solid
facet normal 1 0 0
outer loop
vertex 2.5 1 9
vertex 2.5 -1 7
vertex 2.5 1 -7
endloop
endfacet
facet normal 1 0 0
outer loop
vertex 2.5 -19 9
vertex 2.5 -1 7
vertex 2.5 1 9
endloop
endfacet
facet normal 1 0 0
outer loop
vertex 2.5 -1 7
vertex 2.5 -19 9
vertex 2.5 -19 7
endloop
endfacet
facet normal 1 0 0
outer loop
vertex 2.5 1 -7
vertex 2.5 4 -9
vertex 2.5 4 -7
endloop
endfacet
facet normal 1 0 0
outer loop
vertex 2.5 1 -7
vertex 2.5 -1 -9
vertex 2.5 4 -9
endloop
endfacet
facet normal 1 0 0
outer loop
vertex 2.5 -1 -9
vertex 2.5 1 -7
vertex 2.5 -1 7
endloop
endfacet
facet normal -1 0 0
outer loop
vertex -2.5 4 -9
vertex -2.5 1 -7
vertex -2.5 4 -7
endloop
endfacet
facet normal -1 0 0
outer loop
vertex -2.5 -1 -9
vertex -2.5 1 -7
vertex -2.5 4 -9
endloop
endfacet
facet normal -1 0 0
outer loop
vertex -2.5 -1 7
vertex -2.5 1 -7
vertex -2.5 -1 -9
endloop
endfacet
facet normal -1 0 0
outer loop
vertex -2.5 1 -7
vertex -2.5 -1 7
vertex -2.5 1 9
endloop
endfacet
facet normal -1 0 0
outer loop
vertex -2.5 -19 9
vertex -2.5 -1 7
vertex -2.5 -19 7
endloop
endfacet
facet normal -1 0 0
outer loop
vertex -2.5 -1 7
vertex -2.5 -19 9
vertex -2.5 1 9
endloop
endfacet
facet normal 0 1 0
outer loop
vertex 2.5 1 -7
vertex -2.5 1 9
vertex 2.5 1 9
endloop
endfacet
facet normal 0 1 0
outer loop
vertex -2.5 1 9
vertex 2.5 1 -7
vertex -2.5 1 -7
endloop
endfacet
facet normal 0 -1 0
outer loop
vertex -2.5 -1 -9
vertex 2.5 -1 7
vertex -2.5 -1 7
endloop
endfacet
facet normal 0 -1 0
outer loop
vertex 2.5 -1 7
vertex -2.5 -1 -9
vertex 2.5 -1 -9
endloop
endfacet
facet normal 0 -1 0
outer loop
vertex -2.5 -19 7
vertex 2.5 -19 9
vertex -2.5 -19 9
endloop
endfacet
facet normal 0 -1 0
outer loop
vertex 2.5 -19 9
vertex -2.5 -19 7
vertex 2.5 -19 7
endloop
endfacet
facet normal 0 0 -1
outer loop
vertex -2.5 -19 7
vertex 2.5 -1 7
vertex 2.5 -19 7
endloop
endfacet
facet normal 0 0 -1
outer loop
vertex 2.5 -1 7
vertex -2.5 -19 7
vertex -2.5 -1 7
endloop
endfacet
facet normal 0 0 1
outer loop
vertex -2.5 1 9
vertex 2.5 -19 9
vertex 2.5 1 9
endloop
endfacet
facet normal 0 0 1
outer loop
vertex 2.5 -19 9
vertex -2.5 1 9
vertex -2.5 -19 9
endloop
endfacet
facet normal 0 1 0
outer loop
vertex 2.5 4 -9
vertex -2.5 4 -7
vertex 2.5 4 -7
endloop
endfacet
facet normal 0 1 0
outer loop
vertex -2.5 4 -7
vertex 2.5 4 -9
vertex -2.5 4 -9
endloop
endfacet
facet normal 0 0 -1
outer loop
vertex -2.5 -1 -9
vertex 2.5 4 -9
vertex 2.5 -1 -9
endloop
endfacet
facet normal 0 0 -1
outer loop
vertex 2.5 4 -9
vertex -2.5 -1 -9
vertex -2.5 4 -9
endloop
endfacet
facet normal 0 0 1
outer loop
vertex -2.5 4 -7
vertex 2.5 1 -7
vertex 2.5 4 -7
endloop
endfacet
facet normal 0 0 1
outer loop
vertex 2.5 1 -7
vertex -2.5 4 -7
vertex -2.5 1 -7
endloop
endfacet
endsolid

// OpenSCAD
cube([5,2,15], center=true);

translate([0,-9,8])
    rotate([90,0,0])
        cube([5,2,20], center=true);
        
translate([0,1.5,-8])
    rotate([90,0,0])
        cube([5,2,5], center=true);
